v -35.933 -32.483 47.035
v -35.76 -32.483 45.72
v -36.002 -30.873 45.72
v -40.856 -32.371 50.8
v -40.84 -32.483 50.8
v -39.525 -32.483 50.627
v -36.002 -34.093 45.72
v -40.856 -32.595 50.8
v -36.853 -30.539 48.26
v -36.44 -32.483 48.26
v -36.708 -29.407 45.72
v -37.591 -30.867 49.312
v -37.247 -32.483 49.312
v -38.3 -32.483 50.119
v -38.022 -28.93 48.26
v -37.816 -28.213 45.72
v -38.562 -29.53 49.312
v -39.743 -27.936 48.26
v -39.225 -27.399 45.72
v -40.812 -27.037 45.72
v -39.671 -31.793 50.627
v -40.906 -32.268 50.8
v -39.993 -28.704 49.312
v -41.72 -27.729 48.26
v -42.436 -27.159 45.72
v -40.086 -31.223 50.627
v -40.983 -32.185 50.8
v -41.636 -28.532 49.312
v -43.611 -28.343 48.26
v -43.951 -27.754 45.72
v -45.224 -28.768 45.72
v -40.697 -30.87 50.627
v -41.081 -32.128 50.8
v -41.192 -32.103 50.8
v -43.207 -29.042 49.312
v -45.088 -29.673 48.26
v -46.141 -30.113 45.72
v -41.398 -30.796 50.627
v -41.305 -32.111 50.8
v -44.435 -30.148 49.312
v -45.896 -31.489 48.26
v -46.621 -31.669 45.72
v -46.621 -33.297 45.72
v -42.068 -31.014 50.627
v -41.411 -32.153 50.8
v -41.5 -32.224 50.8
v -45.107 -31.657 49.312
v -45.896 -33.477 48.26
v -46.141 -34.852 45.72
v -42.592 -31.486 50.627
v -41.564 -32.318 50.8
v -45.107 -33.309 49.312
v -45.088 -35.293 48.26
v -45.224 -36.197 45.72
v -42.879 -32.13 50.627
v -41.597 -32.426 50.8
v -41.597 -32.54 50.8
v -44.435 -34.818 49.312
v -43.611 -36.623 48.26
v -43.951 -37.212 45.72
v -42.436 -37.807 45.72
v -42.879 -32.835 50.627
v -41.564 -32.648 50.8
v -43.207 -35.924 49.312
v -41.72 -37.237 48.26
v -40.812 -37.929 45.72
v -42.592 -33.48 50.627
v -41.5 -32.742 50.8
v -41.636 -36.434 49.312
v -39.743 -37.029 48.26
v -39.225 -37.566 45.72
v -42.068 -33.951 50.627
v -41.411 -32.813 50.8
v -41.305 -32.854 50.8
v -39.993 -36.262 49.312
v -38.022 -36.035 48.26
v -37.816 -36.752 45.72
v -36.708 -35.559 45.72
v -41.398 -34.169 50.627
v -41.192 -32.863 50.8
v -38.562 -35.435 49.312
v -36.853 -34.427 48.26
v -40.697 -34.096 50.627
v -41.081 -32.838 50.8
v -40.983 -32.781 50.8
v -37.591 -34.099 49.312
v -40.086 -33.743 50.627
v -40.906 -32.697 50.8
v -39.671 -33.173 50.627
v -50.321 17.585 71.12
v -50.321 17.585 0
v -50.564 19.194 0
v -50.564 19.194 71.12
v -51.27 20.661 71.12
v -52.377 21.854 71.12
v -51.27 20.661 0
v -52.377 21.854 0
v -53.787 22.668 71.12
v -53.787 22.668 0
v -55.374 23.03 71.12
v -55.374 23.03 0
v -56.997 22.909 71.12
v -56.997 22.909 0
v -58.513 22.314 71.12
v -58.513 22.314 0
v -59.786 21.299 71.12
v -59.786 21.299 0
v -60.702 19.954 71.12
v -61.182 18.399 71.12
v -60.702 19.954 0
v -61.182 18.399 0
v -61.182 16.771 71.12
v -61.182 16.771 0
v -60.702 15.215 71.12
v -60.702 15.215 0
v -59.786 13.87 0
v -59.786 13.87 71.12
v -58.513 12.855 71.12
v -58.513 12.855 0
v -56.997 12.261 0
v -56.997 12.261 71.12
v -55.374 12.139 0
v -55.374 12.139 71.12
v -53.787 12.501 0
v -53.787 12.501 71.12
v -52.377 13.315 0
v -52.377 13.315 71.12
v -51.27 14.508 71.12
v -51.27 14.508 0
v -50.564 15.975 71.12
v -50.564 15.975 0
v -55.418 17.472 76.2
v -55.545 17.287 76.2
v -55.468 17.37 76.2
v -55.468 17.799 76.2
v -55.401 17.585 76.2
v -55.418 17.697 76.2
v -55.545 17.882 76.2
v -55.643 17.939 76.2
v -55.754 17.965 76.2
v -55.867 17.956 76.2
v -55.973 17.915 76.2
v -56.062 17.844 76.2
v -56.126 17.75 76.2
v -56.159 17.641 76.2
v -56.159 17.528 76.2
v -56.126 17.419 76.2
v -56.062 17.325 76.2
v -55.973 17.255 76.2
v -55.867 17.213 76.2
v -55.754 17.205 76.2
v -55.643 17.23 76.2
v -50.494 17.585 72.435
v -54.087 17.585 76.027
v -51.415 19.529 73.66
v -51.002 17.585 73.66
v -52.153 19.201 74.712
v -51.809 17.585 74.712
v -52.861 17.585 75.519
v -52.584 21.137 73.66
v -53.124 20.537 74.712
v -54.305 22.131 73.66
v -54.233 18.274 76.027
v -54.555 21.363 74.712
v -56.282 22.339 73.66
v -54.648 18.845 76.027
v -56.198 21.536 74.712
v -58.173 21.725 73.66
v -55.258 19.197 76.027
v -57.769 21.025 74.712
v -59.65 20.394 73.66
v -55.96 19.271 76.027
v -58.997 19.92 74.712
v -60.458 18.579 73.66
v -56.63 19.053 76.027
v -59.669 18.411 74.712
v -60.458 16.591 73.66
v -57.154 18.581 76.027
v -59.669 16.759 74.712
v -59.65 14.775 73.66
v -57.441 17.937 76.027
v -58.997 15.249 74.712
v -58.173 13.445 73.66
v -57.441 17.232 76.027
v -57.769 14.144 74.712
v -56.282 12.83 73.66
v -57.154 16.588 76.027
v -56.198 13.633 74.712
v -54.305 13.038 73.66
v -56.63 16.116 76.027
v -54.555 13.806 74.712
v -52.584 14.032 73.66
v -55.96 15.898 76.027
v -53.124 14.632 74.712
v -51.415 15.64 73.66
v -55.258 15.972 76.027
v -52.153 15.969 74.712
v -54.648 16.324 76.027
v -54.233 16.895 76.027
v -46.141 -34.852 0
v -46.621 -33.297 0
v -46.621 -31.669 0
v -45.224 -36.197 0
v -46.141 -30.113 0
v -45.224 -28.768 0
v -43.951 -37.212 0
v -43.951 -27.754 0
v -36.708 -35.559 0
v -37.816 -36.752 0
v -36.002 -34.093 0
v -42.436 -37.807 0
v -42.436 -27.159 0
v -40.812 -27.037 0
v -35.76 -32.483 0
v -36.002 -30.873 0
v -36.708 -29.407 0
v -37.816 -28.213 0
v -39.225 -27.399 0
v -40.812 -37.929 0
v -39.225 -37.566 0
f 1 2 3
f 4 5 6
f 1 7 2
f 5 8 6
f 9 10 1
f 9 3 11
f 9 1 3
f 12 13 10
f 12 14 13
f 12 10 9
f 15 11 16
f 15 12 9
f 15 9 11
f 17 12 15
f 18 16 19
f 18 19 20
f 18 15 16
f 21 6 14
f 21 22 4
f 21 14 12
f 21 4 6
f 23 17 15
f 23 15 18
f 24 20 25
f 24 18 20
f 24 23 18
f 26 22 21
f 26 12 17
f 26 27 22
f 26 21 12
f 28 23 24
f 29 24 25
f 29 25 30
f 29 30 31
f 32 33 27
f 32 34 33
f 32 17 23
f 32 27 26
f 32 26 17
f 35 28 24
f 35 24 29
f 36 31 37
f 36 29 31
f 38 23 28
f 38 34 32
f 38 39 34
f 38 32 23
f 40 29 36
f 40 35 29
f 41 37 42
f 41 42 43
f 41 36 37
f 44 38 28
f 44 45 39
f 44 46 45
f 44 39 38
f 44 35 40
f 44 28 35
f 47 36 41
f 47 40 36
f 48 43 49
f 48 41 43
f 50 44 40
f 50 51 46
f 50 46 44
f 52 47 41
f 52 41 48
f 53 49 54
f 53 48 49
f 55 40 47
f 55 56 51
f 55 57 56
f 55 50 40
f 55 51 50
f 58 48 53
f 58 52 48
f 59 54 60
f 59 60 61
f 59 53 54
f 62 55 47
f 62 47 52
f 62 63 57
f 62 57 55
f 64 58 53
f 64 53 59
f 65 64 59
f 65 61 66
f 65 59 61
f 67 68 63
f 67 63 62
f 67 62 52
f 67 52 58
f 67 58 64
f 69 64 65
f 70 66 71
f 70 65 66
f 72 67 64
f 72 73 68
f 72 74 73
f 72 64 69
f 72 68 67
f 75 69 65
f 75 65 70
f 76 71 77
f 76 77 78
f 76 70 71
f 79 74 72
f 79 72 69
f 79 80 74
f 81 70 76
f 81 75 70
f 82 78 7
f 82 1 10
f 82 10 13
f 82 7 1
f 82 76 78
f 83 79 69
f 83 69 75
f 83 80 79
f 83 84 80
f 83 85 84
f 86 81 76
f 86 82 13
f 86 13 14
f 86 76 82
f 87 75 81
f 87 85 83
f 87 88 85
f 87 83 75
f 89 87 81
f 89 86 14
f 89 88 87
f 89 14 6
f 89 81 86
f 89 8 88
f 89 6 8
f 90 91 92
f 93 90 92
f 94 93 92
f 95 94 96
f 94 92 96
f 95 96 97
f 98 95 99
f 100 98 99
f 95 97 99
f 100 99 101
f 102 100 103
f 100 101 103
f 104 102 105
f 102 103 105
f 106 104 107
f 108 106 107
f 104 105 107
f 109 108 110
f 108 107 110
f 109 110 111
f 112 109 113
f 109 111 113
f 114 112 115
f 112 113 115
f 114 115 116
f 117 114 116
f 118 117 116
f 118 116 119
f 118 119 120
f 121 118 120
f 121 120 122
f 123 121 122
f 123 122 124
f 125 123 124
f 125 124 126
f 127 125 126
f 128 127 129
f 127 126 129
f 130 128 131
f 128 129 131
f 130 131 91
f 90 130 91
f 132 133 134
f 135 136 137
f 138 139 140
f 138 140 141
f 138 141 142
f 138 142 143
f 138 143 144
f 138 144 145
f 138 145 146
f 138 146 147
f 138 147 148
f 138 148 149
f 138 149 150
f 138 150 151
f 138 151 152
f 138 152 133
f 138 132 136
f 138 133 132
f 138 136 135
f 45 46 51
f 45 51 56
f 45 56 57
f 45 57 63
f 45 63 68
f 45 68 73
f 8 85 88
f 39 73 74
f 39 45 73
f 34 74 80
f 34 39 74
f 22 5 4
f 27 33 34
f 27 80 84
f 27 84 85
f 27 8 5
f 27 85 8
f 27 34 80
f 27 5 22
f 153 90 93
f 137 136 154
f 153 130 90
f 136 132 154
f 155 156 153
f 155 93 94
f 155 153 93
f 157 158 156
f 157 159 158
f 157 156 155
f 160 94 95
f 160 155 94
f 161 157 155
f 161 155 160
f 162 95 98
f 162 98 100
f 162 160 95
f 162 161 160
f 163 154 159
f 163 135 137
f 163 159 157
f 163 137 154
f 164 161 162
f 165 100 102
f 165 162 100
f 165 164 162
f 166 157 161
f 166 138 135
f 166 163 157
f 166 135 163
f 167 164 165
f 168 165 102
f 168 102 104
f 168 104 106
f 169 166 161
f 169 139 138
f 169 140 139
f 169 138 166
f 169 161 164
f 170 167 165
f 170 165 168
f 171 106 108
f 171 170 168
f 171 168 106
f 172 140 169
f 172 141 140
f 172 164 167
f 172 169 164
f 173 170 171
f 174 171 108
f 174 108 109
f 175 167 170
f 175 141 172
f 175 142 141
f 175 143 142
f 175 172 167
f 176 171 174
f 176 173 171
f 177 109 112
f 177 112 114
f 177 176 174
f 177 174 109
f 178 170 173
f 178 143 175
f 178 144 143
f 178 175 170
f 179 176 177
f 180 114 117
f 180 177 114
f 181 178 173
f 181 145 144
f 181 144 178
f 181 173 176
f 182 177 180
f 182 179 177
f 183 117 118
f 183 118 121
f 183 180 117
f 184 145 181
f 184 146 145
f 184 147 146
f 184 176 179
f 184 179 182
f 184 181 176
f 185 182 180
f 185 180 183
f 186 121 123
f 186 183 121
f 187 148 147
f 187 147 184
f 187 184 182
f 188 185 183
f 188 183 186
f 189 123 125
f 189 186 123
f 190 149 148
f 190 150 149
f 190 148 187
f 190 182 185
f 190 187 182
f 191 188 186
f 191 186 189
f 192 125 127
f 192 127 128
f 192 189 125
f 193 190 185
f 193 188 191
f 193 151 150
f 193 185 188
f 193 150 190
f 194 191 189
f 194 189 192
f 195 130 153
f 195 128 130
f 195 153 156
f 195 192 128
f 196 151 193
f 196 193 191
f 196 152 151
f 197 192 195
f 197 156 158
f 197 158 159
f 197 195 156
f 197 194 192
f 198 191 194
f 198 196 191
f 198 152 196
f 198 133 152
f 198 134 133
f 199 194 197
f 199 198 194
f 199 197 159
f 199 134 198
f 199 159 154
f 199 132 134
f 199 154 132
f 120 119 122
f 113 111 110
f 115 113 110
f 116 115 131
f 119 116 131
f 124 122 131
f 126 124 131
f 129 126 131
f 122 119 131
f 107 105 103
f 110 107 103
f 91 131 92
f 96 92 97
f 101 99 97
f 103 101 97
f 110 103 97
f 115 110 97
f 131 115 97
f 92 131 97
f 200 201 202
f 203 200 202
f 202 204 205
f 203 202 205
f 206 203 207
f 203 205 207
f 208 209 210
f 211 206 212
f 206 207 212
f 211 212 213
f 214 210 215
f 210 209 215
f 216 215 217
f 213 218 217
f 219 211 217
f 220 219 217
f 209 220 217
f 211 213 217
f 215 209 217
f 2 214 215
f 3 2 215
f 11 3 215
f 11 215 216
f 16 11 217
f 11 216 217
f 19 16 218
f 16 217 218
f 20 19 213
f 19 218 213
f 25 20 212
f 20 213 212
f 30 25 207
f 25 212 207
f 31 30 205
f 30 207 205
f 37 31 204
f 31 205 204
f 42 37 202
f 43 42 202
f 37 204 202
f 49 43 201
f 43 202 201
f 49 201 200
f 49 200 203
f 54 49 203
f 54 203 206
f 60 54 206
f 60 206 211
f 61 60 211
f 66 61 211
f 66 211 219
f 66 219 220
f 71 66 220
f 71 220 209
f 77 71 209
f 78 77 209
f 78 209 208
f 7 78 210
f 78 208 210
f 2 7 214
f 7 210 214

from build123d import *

# Parameters (mm, degrees)
F0_R     = 5.461
F1_DEPTH = 76.2
F2_R     = 5.461
F3_DEPTH = 50.8
F4_R     = 5.08
F4_2_R   = 5.08


with BuildPart() as f1:
    # F0 (on Top) → F1 (new body)
    with BuildSketch(Plane.XY):
        with Locations((-55.782307, 17.584616)):
            Circle(F0_R)
    extrude(amount=F1_DEPTH)

    # F4
    f4_edges = [f1.edges().sort_by_distance(p)[0] for p in [
        (-61.243307, 17.584616, 76.2),
    ]]
    fillet(f4_edges, radius=F4_R)


with BuildPart() as f3:
    # F2 (on Top) → F3 (new body)
    with BuildSketch(Plane.XY):
        with Locations((-41.220549, -32.48287)):
            Circle(F2_R)
    extrude(amount=F3_DEPTH)

    # F4#2
    f4_2_edges = [f3.edges().sort_by_distance(p)[0] for p in [
        (-46.681549, -32.48287, 50.8),
    ]]
    fillet(f4_2_edges, radius=F4_2_R)


solid = Compound([f1.part, f3.part])
